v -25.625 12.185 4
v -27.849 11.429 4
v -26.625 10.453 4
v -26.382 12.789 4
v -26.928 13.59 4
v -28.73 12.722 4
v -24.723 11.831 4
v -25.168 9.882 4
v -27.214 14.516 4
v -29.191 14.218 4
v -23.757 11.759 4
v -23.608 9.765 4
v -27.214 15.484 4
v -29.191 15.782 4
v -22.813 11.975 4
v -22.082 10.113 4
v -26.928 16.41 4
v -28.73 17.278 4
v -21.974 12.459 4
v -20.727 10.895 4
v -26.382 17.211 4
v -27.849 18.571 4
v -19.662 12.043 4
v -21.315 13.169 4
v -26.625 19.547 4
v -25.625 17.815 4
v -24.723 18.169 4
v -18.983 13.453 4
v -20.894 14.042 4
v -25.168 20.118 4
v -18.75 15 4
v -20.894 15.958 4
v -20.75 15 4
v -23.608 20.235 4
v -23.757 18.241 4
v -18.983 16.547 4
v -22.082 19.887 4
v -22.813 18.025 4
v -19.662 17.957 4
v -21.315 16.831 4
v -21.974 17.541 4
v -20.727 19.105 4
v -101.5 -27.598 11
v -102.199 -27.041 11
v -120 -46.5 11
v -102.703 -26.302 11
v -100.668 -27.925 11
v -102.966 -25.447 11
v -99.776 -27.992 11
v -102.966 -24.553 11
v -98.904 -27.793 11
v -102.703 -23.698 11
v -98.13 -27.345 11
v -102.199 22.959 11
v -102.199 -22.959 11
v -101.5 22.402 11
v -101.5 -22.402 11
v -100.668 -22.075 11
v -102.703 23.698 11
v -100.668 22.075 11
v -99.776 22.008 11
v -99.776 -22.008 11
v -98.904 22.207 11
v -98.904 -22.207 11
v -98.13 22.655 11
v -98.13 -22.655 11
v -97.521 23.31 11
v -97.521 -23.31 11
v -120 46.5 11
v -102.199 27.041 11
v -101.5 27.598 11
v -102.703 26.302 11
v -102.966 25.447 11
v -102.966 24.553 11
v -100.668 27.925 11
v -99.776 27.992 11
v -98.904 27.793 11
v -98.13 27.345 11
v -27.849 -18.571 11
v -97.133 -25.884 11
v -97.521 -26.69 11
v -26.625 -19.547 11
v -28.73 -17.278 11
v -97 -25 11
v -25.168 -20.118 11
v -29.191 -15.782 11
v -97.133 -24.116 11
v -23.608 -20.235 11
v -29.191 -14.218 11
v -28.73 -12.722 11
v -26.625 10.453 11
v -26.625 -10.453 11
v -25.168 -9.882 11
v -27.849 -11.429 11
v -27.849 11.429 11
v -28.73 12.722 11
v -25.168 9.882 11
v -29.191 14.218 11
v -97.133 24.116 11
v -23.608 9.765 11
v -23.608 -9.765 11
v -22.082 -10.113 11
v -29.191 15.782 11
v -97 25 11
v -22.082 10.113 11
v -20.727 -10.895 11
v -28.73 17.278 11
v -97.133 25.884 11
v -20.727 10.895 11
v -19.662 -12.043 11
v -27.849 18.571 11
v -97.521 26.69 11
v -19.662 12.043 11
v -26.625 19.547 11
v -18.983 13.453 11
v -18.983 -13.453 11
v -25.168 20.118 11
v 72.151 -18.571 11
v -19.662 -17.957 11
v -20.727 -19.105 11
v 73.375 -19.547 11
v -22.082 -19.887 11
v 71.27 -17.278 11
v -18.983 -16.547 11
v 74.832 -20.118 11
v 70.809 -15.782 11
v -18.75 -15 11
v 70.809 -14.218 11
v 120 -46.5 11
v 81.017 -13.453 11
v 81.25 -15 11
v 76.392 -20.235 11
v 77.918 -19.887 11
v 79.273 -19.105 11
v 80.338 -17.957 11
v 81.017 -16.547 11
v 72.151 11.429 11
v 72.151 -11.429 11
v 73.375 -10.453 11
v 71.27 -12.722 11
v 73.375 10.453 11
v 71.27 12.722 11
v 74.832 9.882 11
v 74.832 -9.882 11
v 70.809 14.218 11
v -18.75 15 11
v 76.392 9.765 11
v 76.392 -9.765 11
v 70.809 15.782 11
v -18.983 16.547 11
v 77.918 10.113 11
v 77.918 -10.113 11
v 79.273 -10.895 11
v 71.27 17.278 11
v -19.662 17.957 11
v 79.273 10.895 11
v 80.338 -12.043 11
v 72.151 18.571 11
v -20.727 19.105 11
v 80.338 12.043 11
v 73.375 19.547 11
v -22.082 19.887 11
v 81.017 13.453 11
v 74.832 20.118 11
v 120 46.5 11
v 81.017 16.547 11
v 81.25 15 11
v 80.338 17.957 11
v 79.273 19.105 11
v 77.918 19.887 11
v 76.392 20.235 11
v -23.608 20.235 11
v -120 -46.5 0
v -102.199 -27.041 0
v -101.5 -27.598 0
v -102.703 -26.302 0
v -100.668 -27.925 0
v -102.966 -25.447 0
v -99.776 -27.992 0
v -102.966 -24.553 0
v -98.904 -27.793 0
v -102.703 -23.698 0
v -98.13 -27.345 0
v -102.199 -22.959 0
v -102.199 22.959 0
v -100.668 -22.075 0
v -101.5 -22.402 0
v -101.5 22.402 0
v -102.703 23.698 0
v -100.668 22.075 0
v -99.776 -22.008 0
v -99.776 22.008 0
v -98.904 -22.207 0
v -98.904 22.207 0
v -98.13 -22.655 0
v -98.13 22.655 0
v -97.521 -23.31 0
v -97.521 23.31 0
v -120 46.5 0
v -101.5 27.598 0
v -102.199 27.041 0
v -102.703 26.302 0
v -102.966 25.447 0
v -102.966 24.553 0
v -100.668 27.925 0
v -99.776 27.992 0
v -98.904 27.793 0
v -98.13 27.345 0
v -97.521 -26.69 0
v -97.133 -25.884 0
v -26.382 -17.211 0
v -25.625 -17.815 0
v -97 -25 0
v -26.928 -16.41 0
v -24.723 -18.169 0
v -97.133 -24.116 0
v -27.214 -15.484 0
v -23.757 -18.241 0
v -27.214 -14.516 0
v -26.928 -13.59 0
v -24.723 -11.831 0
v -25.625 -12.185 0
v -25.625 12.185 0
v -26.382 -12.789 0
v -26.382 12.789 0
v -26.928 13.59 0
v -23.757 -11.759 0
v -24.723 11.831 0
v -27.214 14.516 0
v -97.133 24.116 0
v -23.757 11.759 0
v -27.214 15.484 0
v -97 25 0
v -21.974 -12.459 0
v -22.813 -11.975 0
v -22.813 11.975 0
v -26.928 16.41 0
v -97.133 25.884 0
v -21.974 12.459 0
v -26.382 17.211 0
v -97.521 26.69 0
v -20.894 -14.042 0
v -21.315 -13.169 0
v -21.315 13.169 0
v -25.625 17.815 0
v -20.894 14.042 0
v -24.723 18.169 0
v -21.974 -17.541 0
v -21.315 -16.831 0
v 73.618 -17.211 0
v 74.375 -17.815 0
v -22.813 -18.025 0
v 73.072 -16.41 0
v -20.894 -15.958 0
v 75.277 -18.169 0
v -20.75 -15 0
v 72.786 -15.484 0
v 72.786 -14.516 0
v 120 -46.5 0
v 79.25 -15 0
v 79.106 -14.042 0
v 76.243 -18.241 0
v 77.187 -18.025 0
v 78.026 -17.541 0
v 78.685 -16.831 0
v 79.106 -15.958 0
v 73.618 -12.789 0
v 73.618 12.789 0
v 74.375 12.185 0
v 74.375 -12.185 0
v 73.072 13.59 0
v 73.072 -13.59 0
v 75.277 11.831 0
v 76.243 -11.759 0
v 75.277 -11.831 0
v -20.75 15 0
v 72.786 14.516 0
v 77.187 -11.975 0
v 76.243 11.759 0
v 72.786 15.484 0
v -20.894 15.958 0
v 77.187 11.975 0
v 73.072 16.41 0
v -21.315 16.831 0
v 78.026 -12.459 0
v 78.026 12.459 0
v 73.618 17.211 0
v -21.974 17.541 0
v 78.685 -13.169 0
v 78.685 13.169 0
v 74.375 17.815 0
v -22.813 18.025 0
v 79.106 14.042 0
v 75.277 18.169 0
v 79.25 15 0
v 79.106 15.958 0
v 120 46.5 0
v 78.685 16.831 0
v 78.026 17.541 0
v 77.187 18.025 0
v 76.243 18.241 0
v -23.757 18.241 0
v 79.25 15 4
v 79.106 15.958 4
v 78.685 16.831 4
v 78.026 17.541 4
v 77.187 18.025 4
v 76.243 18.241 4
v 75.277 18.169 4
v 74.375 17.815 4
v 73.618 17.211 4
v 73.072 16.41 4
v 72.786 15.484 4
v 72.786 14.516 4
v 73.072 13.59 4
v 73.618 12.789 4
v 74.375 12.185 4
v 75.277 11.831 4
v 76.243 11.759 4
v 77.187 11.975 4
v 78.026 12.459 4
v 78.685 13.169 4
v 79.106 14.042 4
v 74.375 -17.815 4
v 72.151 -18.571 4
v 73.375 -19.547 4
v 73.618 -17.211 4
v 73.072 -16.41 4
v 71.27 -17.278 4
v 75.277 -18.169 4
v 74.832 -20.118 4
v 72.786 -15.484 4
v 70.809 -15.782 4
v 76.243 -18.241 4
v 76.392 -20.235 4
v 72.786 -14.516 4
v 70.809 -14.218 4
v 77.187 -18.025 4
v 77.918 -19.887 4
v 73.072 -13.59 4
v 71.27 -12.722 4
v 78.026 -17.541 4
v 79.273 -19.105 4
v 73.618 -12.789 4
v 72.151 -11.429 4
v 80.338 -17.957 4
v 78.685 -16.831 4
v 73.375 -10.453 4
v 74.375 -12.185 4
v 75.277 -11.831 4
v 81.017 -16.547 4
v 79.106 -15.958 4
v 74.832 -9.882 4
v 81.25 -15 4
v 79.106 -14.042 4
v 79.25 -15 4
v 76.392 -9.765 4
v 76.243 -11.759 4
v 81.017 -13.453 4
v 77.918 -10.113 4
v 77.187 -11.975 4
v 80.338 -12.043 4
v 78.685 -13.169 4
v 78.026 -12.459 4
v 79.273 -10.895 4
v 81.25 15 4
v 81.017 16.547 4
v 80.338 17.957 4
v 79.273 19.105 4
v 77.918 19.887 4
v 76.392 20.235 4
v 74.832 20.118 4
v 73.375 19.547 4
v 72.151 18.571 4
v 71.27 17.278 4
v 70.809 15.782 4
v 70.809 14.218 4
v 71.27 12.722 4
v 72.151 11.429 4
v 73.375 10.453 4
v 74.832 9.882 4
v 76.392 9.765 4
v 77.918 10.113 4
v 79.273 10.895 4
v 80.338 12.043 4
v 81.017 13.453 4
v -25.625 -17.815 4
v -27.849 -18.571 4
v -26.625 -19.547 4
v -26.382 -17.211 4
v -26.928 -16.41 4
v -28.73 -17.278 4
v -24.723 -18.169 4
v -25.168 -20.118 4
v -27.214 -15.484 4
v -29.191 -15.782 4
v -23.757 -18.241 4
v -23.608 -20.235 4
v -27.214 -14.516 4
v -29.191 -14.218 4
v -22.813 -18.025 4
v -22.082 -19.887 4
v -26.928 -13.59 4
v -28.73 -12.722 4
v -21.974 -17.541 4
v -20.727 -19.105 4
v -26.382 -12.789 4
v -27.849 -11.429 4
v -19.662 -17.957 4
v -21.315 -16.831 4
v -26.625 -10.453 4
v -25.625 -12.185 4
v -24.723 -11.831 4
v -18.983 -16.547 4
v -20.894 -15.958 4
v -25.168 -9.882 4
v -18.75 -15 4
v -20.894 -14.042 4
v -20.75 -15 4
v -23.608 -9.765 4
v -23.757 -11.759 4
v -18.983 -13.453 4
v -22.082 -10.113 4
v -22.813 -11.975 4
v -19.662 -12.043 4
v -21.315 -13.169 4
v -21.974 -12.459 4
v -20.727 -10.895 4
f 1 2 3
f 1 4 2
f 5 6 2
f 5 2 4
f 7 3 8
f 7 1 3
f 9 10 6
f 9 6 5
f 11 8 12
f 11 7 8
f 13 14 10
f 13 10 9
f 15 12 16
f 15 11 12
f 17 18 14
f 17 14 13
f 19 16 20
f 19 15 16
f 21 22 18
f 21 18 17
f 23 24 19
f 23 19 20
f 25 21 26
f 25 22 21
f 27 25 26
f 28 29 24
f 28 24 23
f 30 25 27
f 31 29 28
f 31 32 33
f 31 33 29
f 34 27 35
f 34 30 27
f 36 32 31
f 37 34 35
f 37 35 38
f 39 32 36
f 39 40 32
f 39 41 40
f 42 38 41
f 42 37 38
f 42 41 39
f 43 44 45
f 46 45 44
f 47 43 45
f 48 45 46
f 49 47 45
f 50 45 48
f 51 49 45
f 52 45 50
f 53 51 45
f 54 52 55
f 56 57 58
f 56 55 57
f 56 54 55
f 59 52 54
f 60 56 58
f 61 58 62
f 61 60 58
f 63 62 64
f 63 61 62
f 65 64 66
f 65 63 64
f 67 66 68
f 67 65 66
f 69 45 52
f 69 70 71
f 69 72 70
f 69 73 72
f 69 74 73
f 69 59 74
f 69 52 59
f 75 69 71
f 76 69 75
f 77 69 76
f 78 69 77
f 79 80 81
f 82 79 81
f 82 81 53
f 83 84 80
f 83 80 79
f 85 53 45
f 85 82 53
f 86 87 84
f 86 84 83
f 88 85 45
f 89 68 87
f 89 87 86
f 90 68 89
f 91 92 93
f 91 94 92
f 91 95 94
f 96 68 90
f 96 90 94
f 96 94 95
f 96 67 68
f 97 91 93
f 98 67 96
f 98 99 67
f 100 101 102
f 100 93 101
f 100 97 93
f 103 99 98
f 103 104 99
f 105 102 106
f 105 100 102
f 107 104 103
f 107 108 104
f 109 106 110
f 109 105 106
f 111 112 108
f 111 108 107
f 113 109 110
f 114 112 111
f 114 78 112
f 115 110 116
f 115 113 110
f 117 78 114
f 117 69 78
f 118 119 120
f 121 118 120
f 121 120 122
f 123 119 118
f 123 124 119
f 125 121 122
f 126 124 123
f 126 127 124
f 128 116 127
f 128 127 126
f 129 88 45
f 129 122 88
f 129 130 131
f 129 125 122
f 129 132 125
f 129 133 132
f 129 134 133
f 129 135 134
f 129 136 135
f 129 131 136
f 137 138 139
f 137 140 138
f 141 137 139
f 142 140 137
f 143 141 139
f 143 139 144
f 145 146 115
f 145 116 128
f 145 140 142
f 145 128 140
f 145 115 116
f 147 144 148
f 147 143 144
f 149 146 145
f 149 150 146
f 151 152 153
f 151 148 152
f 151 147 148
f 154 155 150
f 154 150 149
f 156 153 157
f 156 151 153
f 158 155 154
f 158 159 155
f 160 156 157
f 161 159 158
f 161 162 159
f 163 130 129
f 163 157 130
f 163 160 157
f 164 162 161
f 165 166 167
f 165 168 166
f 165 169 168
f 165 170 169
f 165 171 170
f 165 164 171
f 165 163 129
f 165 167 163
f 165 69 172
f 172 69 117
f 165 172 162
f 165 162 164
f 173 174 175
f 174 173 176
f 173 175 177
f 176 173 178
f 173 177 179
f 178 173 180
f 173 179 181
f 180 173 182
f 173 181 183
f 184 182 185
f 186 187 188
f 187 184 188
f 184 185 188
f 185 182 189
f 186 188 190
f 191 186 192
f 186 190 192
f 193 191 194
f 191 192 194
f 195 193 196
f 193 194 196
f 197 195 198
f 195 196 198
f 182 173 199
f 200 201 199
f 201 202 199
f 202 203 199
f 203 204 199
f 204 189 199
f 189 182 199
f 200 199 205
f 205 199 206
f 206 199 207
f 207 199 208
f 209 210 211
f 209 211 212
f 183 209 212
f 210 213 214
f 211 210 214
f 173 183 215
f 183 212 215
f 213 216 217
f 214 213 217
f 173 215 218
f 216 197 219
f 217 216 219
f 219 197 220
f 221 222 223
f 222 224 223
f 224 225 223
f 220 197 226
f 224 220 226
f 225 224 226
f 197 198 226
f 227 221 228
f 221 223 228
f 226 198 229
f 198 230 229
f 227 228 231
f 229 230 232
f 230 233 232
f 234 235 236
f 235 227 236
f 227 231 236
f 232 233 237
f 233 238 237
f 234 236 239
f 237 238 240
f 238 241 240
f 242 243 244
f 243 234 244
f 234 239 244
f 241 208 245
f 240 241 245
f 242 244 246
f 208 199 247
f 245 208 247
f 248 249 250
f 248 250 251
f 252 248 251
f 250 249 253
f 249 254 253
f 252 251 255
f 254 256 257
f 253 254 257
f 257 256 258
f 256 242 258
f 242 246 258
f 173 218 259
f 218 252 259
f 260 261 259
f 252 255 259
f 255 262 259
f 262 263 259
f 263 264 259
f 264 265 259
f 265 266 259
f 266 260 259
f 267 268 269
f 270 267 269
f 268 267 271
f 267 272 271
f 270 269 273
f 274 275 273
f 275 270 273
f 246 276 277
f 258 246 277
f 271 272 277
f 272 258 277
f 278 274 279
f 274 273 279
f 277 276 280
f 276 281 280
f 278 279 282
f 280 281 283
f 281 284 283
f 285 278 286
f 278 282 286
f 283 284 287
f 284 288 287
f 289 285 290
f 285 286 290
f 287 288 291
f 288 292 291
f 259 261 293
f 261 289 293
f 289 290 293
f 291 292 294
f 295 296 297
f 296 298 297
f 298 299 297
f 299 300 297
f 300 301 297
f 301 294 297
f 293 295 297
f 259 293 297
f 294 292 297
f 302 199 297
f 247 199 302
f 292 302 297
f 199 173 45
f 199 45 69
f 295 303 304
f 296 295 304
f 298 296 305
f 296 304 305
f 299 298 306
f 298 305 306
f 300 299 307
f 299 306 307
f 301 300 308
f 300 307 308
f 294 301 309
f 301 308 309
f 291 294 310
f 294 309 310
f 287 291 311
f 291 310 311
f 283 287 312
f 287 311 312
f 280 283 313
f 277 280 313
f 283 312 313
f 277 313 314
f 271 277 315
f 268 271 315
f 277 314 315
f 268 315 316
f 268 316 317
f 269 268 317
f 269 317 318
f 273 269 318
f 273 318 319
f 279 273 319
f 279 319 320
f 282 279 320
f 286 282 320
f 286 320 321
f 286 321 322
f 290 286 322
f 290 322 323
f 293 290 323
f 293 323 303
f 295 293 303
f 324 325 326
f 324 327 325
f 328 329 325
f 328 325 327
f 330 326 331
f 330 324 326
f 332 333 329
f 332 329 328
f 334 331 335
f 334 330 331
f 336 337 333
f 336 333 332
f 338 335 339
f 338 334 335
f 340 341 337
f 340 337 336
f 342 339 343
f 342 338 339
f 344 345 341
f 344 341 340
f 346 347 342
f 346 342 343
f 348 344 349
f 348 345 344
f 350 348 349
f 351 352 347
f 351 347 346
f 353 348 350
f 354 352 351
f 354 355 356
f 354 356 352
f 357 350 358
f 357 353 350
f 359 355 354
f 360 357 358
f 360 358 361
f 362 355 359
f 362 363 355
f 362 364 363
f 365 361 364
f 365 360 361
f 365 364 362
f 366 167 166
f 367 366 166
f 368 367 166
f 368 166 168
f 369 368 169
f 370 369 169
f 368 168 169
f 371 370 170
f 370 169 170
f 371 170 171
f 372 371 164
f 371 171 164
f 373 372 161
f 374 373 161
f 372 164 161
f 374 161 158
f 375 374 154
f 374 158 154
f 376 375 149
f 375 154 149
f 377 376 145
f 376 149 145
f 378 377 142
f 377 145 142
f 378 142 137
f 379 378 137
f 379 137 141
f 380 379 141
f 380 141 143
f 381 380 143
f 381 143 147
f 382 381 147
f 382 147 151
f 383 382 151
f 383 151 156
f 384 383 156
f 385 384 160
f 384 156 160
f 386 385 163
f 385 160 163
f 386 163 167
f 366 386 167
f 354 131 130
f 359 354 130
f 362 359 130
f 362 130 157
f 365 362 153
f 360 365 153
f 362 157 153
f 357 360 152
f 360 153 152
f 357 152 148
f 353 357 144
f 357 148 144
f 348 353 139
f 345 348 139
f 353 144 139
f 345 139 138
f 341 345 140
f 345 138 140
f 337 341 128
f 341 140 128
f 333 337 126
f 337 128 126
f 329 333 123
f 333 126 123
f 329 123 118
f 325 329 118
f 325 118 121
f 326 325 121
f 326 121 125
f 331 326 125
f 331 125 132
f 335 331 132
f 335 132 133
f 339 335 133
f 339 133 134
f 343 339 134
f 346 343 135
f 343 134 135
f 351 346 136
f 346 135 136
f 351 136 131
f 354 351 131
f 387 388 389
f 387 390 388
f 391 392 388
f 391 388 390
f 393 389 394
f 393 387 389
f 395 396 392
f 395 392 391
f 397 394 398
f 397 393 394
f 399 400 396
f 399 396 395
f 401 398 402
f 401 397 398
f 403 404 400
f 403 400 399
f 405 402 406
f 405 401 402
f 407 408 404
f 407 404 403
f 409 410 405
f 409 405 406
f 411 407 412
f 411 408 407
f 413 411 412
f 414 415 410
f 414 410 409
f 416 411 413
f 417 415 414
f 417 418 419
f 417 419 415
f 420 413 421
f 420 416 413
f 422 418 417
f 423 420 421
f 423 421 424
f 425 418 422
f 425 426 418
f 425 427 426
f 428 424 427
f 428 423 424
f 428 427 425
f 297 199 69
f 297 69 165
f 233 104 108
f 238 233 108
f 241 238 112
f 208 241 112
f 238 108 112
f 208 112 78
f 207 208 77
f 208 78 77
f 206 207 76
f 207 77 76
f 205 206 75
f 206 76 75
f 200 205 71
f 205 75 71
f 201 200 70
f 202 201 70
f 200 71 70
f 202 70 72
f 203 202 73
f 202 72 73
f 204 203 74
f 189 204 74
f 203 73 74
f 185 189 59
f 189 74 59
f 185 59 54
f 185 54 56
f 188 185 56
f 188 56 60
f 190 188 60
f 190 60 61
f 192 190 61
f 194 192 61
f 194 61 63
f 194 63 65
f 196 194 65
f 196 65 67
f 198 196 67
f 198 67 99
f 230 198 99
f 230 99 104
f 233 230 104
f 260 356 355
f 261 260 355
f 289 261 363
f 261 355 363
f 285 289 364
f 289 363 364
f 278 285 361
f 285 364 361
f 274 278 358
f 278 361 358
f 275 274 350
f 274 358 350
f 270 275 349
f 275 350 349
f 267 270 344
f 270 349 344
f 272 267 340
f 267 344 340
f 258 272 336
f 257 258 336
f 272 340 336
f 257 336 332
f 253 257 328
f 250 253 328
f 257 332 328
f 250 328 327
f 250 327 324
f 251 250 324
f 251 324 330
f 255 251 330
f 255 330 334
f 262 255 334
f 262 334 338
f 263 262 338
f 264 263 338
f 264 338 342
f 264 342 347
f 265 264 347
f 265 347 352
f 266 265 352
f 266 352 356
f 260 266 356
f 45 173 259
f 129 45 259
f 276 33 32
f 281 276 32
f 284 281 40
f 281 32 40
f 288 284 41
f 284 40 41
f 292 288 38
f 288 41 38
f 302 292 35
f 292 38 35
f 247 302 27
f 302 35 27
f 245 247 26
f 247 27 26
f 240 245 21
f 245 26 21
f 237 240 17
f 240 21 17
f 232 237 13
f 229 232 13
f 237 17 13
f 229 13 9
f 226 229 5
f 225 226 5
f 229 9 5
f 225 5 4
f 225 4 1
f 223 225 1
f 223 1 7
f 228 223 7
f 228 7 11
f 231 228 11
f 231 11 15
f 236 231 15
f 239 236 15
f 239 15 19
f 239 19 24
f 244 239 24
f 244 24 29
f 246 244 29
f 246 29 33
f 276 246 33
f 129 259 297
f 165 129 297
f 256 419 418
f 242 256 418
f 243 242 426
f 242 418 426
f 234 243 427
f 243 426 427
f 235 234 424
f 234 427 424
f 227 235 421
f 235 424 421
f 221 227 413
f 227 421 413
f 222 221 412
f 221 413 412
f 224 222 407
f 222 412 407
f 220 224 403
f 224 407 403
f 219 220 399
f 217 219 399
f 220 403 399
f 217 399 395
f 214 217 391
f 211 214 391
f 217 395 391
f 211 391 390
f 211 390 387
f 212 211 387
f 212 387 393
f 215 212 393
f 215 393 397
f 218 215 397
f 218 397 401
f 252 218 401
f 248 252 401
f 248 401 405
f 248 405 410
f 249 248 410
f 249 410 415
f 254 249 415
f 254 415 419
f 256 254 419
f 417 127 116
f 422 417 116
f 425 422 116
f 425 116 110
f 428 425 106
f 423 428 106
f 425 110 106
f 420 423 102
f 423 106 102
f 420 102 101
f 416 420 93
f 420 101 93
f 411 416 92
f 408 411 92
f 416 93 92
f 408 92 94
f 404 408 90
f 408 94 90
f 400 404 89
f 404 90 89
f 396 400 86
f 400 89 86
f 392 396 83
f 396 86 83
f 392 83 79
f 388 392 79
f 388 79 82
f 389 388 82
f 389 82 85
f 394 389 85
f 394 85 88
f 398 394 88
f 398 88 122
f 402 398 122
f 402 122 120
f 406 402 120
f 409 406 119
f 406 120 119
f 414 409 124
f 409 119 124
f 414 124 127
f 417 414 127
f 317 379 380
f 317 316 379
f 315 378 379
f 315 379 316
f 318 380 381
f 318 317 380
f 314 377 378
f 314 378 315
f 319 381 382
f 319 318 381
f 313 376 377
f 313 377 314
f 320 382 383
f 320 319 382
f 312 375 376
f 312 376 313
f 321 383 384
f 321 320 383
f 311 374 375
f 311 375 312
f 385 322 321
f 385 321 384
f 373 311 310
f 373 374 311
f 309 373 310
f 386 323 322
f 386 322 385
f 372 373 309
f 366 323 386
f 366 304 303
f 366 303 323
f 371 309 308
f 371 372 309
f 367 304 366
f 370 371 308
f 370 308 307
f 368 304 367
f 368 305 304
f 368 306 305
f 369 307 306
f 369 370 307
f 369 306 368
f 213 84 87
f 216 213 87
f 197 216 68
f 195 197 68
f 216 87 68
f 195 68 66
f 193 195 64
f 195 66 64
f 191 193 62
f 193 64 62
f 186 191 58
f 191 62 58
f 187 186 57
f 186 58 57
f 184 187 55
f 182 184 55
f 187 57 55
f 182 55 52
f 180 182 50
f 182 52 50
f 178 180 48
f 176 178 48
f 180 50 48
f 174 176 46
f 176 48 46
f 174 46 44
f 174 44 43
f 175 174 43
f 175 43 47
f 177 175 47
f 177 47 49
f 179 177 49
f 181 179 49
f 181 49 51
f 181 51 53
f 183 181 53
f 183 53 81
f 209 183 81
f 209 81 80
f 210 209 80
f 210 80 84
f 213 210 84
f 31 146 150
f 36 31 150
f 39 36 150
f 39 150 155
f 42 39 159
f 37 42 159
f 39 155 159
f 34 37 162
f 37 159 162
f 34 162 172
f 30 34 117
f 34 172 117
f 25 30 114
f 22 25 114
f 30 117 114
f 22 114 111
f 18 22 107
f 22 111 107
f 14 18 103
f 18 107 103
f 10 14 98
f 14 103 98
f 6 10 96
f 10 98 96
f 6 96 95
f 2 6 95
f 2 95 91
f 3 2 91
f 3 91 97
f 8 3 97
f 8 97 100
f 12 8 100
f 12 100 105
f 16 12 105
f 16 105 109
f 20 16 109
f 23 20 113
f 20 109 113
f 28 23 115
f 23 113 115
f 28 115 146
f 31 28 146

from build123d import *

# Parameters (mm, degrees)
F0_W     = 240
F0_H     = 93
F1_DEPTH = 11
F2_R     = 3.25
F2_R_2   = 3
F3_DEPTH = 11.001
F4_R     = 5.25
F5_DEPTH = 7


with BuildPart() as f1:
    # F0 (on Top) → F1 (new body)
    with BuildSketch(Plane.XY):
        Rectangle(F0_W, F0_H)
    extrude(amount=F1_DEPTH)

    # F2 (on face) → F3 (cut, through all)
    with BuildSketch(Plane.XY.offset(11)):
        with Locations((76, 15)):
            Circle(F2_R)
        with Locations((-24, 15)):
            Circle(F2_R)
        with Locations((-100, 25)):
            Circle(F2_R_2)
        with Locations((-100, -25)):
            Circle(F2_R_2)
        with Locations((-24, -15)):
            Circle(F2_R)
        with Locations((76, -15)):
            Circle(F2_R)
    extrude(amount=-F3_DEPTH, mode=Mode.SUBTRACT)

    # F4 (on face) → F5 (cut)
    with BuildSketch(Plane.XY.offset(11)):
        with Locations((-24, 15)):
            Circle(F4_R)
        with Locations((76, 15)):
            Circle(F4_R)
        with Locations((76, -15)):
            Circle(F4_R)
        with Locations((-24, -15)):
            Circle(F4_R)
    extrude(amount=-F5_DEPTH, mode=Mode.SUBTRACT)


solid = f1.part
